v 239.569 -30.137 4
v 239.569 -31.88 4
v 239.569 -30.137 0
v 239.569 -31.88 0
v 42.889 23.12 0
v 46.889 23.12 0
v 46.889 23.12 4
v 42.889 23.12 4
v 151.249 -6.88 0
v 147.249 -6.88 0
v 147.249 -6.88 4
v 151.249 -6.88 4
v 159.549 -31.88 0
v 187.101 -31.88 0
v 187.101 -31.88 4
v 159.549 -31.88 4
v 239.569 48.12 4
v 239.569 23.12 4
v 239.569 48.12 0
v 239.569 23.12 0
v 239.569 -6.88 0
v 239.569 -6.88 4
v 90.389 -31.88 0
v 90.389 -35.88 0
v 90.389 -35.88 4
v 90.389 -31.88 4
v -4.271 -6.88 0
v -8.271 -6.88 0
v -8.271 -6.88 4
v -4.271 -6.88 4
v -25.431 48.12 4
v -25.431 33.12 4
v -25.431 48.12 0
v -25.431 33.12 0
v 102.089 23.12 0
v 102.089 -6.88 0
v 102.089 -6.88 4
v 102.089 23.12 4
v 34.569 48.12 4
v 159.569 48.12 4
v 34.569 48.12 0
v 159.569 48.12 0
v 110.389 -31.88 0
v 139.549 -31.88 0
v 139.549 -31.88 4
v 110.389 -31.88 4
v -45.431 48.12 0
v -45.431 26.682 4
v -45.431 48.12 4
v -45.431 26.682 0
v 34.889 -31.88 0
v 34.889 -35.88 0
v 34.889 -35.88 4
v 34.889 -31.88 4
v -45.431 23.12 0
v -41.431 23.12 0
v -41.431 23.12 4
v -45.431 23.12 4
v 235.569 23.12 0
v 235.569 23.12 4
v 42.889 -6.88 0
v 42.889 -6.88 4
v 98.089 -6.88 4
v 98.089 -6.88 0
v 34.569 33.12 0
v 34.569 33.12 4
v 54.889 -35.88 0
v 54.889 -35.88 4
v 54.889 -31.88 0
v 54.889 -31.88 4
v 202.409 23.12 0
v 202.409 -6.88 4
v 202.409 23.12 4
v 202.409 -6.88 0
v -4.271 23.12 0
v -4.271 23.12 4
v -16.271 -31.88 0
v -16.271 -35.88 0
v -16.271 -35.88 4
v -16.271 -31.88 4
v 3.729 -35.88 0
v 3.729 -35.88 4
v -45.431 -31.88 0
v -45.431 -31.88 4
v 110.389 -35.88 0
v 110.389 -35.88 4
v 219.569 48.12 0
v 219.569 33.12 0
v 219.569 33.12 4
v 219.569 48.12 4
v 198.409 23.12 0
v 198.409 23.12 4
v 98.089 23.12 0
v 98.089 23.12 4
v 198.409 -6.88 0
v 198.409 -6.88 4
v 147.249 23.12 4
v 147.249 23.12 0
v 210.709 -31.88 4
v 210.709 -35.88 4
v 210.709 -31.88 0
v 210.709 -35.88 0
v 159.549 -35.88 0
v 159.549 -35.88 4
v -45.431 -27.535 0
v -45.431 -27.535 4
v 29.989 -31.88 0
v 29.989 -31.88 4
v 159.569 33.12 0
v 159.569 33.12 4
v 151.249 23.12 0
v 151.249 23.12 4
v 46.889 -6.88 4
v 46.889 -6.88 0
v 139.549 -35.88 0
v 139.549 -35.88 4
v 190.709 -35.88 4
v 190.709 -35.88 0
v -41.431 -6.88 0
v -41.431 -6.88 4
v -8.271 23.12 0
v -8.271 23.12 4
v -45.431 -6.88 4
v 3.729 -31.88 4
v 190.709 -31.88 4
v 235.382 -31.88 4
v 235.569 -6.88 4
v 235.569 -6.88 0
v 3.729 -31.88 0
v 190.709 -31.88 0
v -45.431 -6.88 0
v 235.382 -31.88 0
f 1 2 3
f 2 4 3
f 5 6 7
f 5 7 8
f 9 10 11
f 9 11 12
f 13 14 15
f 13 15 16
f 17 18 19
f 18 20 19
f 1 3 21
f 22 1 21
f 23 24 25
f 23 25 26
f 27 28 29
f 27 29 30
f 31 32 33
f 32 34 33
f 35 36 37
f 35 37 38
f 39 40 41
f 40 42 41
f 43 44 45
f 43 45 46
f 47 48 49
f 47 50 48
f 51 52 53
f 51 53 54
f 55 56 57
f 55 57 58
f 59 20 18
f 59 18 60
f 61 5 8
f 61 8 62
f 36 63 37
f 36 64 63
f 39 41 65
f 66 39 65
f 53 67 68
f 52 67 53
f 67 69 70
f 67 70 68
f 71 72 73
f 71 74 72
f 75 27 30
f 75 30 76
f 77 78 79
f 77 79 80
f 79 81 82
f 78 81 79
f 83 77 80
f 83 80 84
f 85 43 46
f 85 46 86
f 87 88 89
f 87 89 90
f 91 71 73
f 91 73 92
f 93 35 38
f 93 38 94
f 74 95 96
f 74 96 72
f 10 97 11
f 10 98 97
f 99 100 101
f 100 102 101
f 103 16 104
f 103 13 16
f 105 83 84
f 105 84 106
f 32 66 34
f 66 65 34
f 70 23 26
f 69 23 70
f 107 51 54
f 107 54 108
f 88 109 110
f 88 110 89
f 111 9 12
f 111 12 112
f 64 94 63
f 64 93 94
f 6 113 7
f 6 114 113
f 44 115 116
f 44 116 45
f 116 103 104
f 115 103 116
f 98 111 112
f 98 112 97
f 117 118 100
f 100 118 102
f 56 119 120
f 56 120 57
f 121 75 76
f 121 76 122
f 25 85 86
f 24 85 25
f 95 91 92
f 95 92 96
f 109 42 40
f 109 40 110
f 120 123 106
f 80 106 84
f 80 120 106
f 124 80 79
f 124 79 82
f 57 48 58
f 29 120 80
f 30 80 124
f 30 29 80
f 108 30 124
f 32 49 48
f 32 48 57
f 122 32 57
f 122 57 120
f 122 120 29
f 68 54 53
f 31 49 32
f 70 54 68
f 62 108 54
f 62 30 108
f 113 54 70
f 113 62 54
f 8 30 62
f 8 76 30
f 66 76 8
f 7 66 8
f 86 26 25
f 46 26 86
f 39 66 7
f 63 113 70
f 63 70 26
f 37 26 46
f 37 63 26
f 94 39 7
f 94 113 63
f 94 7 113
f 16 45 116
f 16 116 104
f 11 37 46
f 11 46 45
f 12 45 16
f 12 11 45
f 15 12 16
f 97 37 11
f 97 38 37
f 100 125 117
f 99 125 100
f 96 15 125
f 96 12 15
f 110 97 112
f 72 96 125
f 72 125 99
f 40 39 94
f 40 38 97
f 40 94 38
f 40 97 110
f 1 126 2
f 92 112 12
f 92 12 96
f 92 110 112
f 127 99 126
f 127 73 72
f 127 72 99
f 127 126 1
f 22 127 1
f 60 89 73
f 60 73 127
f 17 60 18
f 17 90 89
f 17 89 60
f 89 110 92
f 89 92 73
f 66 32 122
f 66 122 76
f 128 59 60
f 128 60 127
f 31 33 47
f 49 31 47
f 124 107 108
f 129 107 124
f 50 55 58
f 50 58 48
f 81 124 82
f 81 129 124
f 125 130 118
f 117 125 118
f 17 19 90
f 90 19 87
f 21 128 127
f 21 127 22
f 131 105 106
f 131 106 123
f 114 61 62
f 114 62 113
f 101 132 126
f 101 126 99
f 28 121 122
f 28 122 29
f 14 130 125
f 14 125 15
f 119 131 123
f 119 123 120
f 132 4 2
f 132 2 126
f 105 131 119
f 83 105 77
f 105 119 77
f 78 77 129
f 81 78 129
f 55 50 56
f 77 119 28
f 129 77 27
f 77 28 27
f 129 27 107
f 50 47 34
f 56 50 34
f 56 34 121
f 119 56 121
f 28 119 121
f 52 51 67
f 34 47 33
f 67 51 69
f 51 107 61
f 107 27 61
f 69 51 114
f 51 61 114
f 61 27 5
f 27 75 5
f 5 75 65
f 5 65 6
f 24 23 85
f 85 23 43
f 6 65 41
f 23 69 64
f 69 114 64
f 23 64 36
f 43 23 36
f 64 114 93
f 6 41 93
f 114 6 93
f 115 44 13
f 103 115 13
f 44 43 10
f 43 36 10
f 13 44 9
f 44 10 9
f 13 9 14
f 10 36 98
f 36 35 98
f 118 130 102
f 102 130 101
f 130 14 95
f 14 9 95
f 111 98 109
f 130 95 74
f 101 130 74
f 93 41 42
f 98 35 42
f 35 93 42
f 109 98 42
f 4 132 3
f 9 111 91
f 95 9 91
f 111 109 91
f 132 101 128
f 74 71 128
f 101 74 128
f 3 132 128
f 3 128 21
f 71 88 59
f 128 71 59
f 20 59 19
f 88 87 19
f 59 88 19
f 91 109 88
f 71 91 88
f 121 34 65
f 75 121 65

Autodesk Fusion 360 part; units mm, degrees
sketch "Sketch1" plane through (0, 0, 0) normal (0, 0, 1) x (1, 0, 0)
  line L0 (3.7286, -31.8797) -> (3.7286, -35.8797)
  line L1 (3.7286, -35.8797) -> (-16.2714, -35.8797)
  line L2 (-16.2714, -35.8797) -> (-16.2714, -31.8797)
  line L3 (54.8886, -31.8797) -> (54.8886, -35.8797)
  line L4 (54.8886, -35.8797) -> (34.8886, -35.8797)
  line L5 (34.8886, -35.8797) -> (34.8886, -31.8797)
  line L6 (110.3886, -31.8797) -> (110.3886, -35.8797)
  line L7 (110.3886, -35.8797) -> (90.3886, -35.8797)
  line L8 (90.3886, -35.8797) -> (90.3886, -31.8797)
  line L9 (159.5486, -31.8797) -> (159.5486, -35.8797)
  line L10 (159.5486, -35.8797) -> (139.5486, -35.8797)
  line L11 (139.5486, -35.8797) -> (139.5486, -31.8797)
  line L12 (190.7086, -31.8797) -> (190.7086, -35.8797)
  line L13 (190.7086, -35.8797) -> (210.7086, -35.8797)
  line L14 (210.7086, -35.8797) -> (210.7086, -31.8797)
  line L15 (239.5686, -31.8797) -> (235.3824, -31.8797)
  line L16 (235.3824, -31.8797) -> (210.7086, -31.8797)
  line L17 (190.7086, -31.8797) -> (187.1012, -31.8797)
  line L18 (187.1012, -31.8797) -> (159.5486, -31.8797)
  line L19 (139.5486, -31.8797) -> (110.3886, -31.8797)
  line L20 (90.3886, -31.8797) -> (54.8886, -31.8797)
  line L21 (34.8886, -31.8797) -> (29.9892, -31.8797)
  line L22 (29.9892, -31.8797) -> (3.7286, -31.8797)
  line L23 (-16.2714, -31.8797) -> (-45.4314, -31.8797)
  line L24 (159.5686, 48.1203) -> (159.5686, 33.1203)
  line L25 (159.5686, 33.1203) -> (219.5686, 33.1203)
  line L26 (219.5686, 33.1203) -> (219.5686, 48.1203)
  line L27 (34.5686, 48.1203) -> (34.5686, 33.1203)
  line L28 (34.5686, 33.1203) -> (-25.4314, 33.1203)
  line L29 (-25.4314, 33.1203) -> (-25.4314, 48.1203)
  line L30 (239.5686, 48.1203) -> (219.5686, 48.1203)
  line L31 (159.5686, 48.1203) -> (34.5686, 48.1203)
  line L32 (-25.4314, 48.1203) -> (-45.4314, 48.1203)
  line L33 (-45.4314, -6.8797) -> (-41.4314, -6.8797)
  line L34 (-41.4314, -6.8797) -> (-41.4314, 23.1203)
  line L35 (-41.4314, 23.1203) -> (-45.4314, 23.1203)
  line L36 (-45.4314, -31.8797) -> (-45.4314, -27.5346)
  line L37 (-45.4314, -27.5346) -> (-45.4314, -6.8797)
  line L38 (-45.4314, 23.1203) -> (-45.4314, 26.6822)
  line L39 (-45.4314, 26.6822) -> (-45.4314, 48.1203)
  line L40 (-45.4314, -6.8797) -> (-41.4314, -6.8797)
  line L41 (-41.4314, -6.8797) -> (-41.4314, 23.1203)
  line L42 (-45.4314, 23.1203) -> (-45.4314, 26.6822)
  line L43 (-41.4314, 23.1203) -> (-45.4314, 23.1203)
  line L44 (239.5686, 23.1203) -> (235.5686, 23.1203)
  line L45 (235.5686, -6.8797) -> (239.5686, -6.8797)
  line L46 (239.5686, 23.1203) -> (235.5686, 23.1203)
  line L47 (235.5686, -6.8797) -> (239.5686, -6.8797)
  line L48 (235.5686, 23.1203) -> (235.5686, -6.8797)
  line L49 (239.5686, 23.1203) -> (239.5686, 48.1203)
  line L50 (239.5686, -31.8797) -> (239.5686, -30.1367)
  line L51 (239.5686, -30.1367) -> (239.5686, -6.8797)
  line L52 (-8.2714, -6.8797) -> (-4.2714, -6.8797)
  line L53 (-4.2714, -6.8797) -> (-4.2714, 23.1203)
  line L54 (-4.2714, 23.1203) -> (-8.2714, 23.1203)
  line L55 (-8.2714, 23.1203) -> (-8.2714, -6.8797)
  line L56 (42.8886, -6.8797) -> (46.8886, -6.8797)
  line L57 (46.8886, -6.8797) -> (46.8886, 23.1203)
  line L58 (46.8886, 23.1203) -> (42.8886, 23.1203)
  line L59 (42.8886, 23.1203) -> (42.8886, -6.8797)
  line L60 (98.0886, -6.8797) -> (102.0886, -6.8797)
  line L61 (102.0886, -6.8797) -> (102.0886, 23.1203)
  line L62 (102.0886, 23.1203) -> (98.0886, 23.1203)
  line L63 (98.0886, 23.1203) -> (98.0886, -6.8797)
  line L64 (147.2486, -6.8797) -> (151.2486, -6.8797)
  line L65 (151.2486, -6.8797) -> (151.2486, 23.1203)
  line L66 (151.2486, 23.1203) -> (147.2486, 23.1203)
  line L67 (147.2486, 23.1203) -> (147.2486, -6.8797)
  line L68 (198.4086, -6.8797) -> (202.4086, -6.8797)
  line L69 (202.4086, -6.8797) -> (202.4086, 23.1203)
  line L70 (202.4086, 23.1203) -> (198.4086, 23.1203)
  line L71 (198.4086, 23.1203) -> (198.4086, -6.8797)
extrude "Extrude1" add sketch "Sketch1" along normal blind 4
